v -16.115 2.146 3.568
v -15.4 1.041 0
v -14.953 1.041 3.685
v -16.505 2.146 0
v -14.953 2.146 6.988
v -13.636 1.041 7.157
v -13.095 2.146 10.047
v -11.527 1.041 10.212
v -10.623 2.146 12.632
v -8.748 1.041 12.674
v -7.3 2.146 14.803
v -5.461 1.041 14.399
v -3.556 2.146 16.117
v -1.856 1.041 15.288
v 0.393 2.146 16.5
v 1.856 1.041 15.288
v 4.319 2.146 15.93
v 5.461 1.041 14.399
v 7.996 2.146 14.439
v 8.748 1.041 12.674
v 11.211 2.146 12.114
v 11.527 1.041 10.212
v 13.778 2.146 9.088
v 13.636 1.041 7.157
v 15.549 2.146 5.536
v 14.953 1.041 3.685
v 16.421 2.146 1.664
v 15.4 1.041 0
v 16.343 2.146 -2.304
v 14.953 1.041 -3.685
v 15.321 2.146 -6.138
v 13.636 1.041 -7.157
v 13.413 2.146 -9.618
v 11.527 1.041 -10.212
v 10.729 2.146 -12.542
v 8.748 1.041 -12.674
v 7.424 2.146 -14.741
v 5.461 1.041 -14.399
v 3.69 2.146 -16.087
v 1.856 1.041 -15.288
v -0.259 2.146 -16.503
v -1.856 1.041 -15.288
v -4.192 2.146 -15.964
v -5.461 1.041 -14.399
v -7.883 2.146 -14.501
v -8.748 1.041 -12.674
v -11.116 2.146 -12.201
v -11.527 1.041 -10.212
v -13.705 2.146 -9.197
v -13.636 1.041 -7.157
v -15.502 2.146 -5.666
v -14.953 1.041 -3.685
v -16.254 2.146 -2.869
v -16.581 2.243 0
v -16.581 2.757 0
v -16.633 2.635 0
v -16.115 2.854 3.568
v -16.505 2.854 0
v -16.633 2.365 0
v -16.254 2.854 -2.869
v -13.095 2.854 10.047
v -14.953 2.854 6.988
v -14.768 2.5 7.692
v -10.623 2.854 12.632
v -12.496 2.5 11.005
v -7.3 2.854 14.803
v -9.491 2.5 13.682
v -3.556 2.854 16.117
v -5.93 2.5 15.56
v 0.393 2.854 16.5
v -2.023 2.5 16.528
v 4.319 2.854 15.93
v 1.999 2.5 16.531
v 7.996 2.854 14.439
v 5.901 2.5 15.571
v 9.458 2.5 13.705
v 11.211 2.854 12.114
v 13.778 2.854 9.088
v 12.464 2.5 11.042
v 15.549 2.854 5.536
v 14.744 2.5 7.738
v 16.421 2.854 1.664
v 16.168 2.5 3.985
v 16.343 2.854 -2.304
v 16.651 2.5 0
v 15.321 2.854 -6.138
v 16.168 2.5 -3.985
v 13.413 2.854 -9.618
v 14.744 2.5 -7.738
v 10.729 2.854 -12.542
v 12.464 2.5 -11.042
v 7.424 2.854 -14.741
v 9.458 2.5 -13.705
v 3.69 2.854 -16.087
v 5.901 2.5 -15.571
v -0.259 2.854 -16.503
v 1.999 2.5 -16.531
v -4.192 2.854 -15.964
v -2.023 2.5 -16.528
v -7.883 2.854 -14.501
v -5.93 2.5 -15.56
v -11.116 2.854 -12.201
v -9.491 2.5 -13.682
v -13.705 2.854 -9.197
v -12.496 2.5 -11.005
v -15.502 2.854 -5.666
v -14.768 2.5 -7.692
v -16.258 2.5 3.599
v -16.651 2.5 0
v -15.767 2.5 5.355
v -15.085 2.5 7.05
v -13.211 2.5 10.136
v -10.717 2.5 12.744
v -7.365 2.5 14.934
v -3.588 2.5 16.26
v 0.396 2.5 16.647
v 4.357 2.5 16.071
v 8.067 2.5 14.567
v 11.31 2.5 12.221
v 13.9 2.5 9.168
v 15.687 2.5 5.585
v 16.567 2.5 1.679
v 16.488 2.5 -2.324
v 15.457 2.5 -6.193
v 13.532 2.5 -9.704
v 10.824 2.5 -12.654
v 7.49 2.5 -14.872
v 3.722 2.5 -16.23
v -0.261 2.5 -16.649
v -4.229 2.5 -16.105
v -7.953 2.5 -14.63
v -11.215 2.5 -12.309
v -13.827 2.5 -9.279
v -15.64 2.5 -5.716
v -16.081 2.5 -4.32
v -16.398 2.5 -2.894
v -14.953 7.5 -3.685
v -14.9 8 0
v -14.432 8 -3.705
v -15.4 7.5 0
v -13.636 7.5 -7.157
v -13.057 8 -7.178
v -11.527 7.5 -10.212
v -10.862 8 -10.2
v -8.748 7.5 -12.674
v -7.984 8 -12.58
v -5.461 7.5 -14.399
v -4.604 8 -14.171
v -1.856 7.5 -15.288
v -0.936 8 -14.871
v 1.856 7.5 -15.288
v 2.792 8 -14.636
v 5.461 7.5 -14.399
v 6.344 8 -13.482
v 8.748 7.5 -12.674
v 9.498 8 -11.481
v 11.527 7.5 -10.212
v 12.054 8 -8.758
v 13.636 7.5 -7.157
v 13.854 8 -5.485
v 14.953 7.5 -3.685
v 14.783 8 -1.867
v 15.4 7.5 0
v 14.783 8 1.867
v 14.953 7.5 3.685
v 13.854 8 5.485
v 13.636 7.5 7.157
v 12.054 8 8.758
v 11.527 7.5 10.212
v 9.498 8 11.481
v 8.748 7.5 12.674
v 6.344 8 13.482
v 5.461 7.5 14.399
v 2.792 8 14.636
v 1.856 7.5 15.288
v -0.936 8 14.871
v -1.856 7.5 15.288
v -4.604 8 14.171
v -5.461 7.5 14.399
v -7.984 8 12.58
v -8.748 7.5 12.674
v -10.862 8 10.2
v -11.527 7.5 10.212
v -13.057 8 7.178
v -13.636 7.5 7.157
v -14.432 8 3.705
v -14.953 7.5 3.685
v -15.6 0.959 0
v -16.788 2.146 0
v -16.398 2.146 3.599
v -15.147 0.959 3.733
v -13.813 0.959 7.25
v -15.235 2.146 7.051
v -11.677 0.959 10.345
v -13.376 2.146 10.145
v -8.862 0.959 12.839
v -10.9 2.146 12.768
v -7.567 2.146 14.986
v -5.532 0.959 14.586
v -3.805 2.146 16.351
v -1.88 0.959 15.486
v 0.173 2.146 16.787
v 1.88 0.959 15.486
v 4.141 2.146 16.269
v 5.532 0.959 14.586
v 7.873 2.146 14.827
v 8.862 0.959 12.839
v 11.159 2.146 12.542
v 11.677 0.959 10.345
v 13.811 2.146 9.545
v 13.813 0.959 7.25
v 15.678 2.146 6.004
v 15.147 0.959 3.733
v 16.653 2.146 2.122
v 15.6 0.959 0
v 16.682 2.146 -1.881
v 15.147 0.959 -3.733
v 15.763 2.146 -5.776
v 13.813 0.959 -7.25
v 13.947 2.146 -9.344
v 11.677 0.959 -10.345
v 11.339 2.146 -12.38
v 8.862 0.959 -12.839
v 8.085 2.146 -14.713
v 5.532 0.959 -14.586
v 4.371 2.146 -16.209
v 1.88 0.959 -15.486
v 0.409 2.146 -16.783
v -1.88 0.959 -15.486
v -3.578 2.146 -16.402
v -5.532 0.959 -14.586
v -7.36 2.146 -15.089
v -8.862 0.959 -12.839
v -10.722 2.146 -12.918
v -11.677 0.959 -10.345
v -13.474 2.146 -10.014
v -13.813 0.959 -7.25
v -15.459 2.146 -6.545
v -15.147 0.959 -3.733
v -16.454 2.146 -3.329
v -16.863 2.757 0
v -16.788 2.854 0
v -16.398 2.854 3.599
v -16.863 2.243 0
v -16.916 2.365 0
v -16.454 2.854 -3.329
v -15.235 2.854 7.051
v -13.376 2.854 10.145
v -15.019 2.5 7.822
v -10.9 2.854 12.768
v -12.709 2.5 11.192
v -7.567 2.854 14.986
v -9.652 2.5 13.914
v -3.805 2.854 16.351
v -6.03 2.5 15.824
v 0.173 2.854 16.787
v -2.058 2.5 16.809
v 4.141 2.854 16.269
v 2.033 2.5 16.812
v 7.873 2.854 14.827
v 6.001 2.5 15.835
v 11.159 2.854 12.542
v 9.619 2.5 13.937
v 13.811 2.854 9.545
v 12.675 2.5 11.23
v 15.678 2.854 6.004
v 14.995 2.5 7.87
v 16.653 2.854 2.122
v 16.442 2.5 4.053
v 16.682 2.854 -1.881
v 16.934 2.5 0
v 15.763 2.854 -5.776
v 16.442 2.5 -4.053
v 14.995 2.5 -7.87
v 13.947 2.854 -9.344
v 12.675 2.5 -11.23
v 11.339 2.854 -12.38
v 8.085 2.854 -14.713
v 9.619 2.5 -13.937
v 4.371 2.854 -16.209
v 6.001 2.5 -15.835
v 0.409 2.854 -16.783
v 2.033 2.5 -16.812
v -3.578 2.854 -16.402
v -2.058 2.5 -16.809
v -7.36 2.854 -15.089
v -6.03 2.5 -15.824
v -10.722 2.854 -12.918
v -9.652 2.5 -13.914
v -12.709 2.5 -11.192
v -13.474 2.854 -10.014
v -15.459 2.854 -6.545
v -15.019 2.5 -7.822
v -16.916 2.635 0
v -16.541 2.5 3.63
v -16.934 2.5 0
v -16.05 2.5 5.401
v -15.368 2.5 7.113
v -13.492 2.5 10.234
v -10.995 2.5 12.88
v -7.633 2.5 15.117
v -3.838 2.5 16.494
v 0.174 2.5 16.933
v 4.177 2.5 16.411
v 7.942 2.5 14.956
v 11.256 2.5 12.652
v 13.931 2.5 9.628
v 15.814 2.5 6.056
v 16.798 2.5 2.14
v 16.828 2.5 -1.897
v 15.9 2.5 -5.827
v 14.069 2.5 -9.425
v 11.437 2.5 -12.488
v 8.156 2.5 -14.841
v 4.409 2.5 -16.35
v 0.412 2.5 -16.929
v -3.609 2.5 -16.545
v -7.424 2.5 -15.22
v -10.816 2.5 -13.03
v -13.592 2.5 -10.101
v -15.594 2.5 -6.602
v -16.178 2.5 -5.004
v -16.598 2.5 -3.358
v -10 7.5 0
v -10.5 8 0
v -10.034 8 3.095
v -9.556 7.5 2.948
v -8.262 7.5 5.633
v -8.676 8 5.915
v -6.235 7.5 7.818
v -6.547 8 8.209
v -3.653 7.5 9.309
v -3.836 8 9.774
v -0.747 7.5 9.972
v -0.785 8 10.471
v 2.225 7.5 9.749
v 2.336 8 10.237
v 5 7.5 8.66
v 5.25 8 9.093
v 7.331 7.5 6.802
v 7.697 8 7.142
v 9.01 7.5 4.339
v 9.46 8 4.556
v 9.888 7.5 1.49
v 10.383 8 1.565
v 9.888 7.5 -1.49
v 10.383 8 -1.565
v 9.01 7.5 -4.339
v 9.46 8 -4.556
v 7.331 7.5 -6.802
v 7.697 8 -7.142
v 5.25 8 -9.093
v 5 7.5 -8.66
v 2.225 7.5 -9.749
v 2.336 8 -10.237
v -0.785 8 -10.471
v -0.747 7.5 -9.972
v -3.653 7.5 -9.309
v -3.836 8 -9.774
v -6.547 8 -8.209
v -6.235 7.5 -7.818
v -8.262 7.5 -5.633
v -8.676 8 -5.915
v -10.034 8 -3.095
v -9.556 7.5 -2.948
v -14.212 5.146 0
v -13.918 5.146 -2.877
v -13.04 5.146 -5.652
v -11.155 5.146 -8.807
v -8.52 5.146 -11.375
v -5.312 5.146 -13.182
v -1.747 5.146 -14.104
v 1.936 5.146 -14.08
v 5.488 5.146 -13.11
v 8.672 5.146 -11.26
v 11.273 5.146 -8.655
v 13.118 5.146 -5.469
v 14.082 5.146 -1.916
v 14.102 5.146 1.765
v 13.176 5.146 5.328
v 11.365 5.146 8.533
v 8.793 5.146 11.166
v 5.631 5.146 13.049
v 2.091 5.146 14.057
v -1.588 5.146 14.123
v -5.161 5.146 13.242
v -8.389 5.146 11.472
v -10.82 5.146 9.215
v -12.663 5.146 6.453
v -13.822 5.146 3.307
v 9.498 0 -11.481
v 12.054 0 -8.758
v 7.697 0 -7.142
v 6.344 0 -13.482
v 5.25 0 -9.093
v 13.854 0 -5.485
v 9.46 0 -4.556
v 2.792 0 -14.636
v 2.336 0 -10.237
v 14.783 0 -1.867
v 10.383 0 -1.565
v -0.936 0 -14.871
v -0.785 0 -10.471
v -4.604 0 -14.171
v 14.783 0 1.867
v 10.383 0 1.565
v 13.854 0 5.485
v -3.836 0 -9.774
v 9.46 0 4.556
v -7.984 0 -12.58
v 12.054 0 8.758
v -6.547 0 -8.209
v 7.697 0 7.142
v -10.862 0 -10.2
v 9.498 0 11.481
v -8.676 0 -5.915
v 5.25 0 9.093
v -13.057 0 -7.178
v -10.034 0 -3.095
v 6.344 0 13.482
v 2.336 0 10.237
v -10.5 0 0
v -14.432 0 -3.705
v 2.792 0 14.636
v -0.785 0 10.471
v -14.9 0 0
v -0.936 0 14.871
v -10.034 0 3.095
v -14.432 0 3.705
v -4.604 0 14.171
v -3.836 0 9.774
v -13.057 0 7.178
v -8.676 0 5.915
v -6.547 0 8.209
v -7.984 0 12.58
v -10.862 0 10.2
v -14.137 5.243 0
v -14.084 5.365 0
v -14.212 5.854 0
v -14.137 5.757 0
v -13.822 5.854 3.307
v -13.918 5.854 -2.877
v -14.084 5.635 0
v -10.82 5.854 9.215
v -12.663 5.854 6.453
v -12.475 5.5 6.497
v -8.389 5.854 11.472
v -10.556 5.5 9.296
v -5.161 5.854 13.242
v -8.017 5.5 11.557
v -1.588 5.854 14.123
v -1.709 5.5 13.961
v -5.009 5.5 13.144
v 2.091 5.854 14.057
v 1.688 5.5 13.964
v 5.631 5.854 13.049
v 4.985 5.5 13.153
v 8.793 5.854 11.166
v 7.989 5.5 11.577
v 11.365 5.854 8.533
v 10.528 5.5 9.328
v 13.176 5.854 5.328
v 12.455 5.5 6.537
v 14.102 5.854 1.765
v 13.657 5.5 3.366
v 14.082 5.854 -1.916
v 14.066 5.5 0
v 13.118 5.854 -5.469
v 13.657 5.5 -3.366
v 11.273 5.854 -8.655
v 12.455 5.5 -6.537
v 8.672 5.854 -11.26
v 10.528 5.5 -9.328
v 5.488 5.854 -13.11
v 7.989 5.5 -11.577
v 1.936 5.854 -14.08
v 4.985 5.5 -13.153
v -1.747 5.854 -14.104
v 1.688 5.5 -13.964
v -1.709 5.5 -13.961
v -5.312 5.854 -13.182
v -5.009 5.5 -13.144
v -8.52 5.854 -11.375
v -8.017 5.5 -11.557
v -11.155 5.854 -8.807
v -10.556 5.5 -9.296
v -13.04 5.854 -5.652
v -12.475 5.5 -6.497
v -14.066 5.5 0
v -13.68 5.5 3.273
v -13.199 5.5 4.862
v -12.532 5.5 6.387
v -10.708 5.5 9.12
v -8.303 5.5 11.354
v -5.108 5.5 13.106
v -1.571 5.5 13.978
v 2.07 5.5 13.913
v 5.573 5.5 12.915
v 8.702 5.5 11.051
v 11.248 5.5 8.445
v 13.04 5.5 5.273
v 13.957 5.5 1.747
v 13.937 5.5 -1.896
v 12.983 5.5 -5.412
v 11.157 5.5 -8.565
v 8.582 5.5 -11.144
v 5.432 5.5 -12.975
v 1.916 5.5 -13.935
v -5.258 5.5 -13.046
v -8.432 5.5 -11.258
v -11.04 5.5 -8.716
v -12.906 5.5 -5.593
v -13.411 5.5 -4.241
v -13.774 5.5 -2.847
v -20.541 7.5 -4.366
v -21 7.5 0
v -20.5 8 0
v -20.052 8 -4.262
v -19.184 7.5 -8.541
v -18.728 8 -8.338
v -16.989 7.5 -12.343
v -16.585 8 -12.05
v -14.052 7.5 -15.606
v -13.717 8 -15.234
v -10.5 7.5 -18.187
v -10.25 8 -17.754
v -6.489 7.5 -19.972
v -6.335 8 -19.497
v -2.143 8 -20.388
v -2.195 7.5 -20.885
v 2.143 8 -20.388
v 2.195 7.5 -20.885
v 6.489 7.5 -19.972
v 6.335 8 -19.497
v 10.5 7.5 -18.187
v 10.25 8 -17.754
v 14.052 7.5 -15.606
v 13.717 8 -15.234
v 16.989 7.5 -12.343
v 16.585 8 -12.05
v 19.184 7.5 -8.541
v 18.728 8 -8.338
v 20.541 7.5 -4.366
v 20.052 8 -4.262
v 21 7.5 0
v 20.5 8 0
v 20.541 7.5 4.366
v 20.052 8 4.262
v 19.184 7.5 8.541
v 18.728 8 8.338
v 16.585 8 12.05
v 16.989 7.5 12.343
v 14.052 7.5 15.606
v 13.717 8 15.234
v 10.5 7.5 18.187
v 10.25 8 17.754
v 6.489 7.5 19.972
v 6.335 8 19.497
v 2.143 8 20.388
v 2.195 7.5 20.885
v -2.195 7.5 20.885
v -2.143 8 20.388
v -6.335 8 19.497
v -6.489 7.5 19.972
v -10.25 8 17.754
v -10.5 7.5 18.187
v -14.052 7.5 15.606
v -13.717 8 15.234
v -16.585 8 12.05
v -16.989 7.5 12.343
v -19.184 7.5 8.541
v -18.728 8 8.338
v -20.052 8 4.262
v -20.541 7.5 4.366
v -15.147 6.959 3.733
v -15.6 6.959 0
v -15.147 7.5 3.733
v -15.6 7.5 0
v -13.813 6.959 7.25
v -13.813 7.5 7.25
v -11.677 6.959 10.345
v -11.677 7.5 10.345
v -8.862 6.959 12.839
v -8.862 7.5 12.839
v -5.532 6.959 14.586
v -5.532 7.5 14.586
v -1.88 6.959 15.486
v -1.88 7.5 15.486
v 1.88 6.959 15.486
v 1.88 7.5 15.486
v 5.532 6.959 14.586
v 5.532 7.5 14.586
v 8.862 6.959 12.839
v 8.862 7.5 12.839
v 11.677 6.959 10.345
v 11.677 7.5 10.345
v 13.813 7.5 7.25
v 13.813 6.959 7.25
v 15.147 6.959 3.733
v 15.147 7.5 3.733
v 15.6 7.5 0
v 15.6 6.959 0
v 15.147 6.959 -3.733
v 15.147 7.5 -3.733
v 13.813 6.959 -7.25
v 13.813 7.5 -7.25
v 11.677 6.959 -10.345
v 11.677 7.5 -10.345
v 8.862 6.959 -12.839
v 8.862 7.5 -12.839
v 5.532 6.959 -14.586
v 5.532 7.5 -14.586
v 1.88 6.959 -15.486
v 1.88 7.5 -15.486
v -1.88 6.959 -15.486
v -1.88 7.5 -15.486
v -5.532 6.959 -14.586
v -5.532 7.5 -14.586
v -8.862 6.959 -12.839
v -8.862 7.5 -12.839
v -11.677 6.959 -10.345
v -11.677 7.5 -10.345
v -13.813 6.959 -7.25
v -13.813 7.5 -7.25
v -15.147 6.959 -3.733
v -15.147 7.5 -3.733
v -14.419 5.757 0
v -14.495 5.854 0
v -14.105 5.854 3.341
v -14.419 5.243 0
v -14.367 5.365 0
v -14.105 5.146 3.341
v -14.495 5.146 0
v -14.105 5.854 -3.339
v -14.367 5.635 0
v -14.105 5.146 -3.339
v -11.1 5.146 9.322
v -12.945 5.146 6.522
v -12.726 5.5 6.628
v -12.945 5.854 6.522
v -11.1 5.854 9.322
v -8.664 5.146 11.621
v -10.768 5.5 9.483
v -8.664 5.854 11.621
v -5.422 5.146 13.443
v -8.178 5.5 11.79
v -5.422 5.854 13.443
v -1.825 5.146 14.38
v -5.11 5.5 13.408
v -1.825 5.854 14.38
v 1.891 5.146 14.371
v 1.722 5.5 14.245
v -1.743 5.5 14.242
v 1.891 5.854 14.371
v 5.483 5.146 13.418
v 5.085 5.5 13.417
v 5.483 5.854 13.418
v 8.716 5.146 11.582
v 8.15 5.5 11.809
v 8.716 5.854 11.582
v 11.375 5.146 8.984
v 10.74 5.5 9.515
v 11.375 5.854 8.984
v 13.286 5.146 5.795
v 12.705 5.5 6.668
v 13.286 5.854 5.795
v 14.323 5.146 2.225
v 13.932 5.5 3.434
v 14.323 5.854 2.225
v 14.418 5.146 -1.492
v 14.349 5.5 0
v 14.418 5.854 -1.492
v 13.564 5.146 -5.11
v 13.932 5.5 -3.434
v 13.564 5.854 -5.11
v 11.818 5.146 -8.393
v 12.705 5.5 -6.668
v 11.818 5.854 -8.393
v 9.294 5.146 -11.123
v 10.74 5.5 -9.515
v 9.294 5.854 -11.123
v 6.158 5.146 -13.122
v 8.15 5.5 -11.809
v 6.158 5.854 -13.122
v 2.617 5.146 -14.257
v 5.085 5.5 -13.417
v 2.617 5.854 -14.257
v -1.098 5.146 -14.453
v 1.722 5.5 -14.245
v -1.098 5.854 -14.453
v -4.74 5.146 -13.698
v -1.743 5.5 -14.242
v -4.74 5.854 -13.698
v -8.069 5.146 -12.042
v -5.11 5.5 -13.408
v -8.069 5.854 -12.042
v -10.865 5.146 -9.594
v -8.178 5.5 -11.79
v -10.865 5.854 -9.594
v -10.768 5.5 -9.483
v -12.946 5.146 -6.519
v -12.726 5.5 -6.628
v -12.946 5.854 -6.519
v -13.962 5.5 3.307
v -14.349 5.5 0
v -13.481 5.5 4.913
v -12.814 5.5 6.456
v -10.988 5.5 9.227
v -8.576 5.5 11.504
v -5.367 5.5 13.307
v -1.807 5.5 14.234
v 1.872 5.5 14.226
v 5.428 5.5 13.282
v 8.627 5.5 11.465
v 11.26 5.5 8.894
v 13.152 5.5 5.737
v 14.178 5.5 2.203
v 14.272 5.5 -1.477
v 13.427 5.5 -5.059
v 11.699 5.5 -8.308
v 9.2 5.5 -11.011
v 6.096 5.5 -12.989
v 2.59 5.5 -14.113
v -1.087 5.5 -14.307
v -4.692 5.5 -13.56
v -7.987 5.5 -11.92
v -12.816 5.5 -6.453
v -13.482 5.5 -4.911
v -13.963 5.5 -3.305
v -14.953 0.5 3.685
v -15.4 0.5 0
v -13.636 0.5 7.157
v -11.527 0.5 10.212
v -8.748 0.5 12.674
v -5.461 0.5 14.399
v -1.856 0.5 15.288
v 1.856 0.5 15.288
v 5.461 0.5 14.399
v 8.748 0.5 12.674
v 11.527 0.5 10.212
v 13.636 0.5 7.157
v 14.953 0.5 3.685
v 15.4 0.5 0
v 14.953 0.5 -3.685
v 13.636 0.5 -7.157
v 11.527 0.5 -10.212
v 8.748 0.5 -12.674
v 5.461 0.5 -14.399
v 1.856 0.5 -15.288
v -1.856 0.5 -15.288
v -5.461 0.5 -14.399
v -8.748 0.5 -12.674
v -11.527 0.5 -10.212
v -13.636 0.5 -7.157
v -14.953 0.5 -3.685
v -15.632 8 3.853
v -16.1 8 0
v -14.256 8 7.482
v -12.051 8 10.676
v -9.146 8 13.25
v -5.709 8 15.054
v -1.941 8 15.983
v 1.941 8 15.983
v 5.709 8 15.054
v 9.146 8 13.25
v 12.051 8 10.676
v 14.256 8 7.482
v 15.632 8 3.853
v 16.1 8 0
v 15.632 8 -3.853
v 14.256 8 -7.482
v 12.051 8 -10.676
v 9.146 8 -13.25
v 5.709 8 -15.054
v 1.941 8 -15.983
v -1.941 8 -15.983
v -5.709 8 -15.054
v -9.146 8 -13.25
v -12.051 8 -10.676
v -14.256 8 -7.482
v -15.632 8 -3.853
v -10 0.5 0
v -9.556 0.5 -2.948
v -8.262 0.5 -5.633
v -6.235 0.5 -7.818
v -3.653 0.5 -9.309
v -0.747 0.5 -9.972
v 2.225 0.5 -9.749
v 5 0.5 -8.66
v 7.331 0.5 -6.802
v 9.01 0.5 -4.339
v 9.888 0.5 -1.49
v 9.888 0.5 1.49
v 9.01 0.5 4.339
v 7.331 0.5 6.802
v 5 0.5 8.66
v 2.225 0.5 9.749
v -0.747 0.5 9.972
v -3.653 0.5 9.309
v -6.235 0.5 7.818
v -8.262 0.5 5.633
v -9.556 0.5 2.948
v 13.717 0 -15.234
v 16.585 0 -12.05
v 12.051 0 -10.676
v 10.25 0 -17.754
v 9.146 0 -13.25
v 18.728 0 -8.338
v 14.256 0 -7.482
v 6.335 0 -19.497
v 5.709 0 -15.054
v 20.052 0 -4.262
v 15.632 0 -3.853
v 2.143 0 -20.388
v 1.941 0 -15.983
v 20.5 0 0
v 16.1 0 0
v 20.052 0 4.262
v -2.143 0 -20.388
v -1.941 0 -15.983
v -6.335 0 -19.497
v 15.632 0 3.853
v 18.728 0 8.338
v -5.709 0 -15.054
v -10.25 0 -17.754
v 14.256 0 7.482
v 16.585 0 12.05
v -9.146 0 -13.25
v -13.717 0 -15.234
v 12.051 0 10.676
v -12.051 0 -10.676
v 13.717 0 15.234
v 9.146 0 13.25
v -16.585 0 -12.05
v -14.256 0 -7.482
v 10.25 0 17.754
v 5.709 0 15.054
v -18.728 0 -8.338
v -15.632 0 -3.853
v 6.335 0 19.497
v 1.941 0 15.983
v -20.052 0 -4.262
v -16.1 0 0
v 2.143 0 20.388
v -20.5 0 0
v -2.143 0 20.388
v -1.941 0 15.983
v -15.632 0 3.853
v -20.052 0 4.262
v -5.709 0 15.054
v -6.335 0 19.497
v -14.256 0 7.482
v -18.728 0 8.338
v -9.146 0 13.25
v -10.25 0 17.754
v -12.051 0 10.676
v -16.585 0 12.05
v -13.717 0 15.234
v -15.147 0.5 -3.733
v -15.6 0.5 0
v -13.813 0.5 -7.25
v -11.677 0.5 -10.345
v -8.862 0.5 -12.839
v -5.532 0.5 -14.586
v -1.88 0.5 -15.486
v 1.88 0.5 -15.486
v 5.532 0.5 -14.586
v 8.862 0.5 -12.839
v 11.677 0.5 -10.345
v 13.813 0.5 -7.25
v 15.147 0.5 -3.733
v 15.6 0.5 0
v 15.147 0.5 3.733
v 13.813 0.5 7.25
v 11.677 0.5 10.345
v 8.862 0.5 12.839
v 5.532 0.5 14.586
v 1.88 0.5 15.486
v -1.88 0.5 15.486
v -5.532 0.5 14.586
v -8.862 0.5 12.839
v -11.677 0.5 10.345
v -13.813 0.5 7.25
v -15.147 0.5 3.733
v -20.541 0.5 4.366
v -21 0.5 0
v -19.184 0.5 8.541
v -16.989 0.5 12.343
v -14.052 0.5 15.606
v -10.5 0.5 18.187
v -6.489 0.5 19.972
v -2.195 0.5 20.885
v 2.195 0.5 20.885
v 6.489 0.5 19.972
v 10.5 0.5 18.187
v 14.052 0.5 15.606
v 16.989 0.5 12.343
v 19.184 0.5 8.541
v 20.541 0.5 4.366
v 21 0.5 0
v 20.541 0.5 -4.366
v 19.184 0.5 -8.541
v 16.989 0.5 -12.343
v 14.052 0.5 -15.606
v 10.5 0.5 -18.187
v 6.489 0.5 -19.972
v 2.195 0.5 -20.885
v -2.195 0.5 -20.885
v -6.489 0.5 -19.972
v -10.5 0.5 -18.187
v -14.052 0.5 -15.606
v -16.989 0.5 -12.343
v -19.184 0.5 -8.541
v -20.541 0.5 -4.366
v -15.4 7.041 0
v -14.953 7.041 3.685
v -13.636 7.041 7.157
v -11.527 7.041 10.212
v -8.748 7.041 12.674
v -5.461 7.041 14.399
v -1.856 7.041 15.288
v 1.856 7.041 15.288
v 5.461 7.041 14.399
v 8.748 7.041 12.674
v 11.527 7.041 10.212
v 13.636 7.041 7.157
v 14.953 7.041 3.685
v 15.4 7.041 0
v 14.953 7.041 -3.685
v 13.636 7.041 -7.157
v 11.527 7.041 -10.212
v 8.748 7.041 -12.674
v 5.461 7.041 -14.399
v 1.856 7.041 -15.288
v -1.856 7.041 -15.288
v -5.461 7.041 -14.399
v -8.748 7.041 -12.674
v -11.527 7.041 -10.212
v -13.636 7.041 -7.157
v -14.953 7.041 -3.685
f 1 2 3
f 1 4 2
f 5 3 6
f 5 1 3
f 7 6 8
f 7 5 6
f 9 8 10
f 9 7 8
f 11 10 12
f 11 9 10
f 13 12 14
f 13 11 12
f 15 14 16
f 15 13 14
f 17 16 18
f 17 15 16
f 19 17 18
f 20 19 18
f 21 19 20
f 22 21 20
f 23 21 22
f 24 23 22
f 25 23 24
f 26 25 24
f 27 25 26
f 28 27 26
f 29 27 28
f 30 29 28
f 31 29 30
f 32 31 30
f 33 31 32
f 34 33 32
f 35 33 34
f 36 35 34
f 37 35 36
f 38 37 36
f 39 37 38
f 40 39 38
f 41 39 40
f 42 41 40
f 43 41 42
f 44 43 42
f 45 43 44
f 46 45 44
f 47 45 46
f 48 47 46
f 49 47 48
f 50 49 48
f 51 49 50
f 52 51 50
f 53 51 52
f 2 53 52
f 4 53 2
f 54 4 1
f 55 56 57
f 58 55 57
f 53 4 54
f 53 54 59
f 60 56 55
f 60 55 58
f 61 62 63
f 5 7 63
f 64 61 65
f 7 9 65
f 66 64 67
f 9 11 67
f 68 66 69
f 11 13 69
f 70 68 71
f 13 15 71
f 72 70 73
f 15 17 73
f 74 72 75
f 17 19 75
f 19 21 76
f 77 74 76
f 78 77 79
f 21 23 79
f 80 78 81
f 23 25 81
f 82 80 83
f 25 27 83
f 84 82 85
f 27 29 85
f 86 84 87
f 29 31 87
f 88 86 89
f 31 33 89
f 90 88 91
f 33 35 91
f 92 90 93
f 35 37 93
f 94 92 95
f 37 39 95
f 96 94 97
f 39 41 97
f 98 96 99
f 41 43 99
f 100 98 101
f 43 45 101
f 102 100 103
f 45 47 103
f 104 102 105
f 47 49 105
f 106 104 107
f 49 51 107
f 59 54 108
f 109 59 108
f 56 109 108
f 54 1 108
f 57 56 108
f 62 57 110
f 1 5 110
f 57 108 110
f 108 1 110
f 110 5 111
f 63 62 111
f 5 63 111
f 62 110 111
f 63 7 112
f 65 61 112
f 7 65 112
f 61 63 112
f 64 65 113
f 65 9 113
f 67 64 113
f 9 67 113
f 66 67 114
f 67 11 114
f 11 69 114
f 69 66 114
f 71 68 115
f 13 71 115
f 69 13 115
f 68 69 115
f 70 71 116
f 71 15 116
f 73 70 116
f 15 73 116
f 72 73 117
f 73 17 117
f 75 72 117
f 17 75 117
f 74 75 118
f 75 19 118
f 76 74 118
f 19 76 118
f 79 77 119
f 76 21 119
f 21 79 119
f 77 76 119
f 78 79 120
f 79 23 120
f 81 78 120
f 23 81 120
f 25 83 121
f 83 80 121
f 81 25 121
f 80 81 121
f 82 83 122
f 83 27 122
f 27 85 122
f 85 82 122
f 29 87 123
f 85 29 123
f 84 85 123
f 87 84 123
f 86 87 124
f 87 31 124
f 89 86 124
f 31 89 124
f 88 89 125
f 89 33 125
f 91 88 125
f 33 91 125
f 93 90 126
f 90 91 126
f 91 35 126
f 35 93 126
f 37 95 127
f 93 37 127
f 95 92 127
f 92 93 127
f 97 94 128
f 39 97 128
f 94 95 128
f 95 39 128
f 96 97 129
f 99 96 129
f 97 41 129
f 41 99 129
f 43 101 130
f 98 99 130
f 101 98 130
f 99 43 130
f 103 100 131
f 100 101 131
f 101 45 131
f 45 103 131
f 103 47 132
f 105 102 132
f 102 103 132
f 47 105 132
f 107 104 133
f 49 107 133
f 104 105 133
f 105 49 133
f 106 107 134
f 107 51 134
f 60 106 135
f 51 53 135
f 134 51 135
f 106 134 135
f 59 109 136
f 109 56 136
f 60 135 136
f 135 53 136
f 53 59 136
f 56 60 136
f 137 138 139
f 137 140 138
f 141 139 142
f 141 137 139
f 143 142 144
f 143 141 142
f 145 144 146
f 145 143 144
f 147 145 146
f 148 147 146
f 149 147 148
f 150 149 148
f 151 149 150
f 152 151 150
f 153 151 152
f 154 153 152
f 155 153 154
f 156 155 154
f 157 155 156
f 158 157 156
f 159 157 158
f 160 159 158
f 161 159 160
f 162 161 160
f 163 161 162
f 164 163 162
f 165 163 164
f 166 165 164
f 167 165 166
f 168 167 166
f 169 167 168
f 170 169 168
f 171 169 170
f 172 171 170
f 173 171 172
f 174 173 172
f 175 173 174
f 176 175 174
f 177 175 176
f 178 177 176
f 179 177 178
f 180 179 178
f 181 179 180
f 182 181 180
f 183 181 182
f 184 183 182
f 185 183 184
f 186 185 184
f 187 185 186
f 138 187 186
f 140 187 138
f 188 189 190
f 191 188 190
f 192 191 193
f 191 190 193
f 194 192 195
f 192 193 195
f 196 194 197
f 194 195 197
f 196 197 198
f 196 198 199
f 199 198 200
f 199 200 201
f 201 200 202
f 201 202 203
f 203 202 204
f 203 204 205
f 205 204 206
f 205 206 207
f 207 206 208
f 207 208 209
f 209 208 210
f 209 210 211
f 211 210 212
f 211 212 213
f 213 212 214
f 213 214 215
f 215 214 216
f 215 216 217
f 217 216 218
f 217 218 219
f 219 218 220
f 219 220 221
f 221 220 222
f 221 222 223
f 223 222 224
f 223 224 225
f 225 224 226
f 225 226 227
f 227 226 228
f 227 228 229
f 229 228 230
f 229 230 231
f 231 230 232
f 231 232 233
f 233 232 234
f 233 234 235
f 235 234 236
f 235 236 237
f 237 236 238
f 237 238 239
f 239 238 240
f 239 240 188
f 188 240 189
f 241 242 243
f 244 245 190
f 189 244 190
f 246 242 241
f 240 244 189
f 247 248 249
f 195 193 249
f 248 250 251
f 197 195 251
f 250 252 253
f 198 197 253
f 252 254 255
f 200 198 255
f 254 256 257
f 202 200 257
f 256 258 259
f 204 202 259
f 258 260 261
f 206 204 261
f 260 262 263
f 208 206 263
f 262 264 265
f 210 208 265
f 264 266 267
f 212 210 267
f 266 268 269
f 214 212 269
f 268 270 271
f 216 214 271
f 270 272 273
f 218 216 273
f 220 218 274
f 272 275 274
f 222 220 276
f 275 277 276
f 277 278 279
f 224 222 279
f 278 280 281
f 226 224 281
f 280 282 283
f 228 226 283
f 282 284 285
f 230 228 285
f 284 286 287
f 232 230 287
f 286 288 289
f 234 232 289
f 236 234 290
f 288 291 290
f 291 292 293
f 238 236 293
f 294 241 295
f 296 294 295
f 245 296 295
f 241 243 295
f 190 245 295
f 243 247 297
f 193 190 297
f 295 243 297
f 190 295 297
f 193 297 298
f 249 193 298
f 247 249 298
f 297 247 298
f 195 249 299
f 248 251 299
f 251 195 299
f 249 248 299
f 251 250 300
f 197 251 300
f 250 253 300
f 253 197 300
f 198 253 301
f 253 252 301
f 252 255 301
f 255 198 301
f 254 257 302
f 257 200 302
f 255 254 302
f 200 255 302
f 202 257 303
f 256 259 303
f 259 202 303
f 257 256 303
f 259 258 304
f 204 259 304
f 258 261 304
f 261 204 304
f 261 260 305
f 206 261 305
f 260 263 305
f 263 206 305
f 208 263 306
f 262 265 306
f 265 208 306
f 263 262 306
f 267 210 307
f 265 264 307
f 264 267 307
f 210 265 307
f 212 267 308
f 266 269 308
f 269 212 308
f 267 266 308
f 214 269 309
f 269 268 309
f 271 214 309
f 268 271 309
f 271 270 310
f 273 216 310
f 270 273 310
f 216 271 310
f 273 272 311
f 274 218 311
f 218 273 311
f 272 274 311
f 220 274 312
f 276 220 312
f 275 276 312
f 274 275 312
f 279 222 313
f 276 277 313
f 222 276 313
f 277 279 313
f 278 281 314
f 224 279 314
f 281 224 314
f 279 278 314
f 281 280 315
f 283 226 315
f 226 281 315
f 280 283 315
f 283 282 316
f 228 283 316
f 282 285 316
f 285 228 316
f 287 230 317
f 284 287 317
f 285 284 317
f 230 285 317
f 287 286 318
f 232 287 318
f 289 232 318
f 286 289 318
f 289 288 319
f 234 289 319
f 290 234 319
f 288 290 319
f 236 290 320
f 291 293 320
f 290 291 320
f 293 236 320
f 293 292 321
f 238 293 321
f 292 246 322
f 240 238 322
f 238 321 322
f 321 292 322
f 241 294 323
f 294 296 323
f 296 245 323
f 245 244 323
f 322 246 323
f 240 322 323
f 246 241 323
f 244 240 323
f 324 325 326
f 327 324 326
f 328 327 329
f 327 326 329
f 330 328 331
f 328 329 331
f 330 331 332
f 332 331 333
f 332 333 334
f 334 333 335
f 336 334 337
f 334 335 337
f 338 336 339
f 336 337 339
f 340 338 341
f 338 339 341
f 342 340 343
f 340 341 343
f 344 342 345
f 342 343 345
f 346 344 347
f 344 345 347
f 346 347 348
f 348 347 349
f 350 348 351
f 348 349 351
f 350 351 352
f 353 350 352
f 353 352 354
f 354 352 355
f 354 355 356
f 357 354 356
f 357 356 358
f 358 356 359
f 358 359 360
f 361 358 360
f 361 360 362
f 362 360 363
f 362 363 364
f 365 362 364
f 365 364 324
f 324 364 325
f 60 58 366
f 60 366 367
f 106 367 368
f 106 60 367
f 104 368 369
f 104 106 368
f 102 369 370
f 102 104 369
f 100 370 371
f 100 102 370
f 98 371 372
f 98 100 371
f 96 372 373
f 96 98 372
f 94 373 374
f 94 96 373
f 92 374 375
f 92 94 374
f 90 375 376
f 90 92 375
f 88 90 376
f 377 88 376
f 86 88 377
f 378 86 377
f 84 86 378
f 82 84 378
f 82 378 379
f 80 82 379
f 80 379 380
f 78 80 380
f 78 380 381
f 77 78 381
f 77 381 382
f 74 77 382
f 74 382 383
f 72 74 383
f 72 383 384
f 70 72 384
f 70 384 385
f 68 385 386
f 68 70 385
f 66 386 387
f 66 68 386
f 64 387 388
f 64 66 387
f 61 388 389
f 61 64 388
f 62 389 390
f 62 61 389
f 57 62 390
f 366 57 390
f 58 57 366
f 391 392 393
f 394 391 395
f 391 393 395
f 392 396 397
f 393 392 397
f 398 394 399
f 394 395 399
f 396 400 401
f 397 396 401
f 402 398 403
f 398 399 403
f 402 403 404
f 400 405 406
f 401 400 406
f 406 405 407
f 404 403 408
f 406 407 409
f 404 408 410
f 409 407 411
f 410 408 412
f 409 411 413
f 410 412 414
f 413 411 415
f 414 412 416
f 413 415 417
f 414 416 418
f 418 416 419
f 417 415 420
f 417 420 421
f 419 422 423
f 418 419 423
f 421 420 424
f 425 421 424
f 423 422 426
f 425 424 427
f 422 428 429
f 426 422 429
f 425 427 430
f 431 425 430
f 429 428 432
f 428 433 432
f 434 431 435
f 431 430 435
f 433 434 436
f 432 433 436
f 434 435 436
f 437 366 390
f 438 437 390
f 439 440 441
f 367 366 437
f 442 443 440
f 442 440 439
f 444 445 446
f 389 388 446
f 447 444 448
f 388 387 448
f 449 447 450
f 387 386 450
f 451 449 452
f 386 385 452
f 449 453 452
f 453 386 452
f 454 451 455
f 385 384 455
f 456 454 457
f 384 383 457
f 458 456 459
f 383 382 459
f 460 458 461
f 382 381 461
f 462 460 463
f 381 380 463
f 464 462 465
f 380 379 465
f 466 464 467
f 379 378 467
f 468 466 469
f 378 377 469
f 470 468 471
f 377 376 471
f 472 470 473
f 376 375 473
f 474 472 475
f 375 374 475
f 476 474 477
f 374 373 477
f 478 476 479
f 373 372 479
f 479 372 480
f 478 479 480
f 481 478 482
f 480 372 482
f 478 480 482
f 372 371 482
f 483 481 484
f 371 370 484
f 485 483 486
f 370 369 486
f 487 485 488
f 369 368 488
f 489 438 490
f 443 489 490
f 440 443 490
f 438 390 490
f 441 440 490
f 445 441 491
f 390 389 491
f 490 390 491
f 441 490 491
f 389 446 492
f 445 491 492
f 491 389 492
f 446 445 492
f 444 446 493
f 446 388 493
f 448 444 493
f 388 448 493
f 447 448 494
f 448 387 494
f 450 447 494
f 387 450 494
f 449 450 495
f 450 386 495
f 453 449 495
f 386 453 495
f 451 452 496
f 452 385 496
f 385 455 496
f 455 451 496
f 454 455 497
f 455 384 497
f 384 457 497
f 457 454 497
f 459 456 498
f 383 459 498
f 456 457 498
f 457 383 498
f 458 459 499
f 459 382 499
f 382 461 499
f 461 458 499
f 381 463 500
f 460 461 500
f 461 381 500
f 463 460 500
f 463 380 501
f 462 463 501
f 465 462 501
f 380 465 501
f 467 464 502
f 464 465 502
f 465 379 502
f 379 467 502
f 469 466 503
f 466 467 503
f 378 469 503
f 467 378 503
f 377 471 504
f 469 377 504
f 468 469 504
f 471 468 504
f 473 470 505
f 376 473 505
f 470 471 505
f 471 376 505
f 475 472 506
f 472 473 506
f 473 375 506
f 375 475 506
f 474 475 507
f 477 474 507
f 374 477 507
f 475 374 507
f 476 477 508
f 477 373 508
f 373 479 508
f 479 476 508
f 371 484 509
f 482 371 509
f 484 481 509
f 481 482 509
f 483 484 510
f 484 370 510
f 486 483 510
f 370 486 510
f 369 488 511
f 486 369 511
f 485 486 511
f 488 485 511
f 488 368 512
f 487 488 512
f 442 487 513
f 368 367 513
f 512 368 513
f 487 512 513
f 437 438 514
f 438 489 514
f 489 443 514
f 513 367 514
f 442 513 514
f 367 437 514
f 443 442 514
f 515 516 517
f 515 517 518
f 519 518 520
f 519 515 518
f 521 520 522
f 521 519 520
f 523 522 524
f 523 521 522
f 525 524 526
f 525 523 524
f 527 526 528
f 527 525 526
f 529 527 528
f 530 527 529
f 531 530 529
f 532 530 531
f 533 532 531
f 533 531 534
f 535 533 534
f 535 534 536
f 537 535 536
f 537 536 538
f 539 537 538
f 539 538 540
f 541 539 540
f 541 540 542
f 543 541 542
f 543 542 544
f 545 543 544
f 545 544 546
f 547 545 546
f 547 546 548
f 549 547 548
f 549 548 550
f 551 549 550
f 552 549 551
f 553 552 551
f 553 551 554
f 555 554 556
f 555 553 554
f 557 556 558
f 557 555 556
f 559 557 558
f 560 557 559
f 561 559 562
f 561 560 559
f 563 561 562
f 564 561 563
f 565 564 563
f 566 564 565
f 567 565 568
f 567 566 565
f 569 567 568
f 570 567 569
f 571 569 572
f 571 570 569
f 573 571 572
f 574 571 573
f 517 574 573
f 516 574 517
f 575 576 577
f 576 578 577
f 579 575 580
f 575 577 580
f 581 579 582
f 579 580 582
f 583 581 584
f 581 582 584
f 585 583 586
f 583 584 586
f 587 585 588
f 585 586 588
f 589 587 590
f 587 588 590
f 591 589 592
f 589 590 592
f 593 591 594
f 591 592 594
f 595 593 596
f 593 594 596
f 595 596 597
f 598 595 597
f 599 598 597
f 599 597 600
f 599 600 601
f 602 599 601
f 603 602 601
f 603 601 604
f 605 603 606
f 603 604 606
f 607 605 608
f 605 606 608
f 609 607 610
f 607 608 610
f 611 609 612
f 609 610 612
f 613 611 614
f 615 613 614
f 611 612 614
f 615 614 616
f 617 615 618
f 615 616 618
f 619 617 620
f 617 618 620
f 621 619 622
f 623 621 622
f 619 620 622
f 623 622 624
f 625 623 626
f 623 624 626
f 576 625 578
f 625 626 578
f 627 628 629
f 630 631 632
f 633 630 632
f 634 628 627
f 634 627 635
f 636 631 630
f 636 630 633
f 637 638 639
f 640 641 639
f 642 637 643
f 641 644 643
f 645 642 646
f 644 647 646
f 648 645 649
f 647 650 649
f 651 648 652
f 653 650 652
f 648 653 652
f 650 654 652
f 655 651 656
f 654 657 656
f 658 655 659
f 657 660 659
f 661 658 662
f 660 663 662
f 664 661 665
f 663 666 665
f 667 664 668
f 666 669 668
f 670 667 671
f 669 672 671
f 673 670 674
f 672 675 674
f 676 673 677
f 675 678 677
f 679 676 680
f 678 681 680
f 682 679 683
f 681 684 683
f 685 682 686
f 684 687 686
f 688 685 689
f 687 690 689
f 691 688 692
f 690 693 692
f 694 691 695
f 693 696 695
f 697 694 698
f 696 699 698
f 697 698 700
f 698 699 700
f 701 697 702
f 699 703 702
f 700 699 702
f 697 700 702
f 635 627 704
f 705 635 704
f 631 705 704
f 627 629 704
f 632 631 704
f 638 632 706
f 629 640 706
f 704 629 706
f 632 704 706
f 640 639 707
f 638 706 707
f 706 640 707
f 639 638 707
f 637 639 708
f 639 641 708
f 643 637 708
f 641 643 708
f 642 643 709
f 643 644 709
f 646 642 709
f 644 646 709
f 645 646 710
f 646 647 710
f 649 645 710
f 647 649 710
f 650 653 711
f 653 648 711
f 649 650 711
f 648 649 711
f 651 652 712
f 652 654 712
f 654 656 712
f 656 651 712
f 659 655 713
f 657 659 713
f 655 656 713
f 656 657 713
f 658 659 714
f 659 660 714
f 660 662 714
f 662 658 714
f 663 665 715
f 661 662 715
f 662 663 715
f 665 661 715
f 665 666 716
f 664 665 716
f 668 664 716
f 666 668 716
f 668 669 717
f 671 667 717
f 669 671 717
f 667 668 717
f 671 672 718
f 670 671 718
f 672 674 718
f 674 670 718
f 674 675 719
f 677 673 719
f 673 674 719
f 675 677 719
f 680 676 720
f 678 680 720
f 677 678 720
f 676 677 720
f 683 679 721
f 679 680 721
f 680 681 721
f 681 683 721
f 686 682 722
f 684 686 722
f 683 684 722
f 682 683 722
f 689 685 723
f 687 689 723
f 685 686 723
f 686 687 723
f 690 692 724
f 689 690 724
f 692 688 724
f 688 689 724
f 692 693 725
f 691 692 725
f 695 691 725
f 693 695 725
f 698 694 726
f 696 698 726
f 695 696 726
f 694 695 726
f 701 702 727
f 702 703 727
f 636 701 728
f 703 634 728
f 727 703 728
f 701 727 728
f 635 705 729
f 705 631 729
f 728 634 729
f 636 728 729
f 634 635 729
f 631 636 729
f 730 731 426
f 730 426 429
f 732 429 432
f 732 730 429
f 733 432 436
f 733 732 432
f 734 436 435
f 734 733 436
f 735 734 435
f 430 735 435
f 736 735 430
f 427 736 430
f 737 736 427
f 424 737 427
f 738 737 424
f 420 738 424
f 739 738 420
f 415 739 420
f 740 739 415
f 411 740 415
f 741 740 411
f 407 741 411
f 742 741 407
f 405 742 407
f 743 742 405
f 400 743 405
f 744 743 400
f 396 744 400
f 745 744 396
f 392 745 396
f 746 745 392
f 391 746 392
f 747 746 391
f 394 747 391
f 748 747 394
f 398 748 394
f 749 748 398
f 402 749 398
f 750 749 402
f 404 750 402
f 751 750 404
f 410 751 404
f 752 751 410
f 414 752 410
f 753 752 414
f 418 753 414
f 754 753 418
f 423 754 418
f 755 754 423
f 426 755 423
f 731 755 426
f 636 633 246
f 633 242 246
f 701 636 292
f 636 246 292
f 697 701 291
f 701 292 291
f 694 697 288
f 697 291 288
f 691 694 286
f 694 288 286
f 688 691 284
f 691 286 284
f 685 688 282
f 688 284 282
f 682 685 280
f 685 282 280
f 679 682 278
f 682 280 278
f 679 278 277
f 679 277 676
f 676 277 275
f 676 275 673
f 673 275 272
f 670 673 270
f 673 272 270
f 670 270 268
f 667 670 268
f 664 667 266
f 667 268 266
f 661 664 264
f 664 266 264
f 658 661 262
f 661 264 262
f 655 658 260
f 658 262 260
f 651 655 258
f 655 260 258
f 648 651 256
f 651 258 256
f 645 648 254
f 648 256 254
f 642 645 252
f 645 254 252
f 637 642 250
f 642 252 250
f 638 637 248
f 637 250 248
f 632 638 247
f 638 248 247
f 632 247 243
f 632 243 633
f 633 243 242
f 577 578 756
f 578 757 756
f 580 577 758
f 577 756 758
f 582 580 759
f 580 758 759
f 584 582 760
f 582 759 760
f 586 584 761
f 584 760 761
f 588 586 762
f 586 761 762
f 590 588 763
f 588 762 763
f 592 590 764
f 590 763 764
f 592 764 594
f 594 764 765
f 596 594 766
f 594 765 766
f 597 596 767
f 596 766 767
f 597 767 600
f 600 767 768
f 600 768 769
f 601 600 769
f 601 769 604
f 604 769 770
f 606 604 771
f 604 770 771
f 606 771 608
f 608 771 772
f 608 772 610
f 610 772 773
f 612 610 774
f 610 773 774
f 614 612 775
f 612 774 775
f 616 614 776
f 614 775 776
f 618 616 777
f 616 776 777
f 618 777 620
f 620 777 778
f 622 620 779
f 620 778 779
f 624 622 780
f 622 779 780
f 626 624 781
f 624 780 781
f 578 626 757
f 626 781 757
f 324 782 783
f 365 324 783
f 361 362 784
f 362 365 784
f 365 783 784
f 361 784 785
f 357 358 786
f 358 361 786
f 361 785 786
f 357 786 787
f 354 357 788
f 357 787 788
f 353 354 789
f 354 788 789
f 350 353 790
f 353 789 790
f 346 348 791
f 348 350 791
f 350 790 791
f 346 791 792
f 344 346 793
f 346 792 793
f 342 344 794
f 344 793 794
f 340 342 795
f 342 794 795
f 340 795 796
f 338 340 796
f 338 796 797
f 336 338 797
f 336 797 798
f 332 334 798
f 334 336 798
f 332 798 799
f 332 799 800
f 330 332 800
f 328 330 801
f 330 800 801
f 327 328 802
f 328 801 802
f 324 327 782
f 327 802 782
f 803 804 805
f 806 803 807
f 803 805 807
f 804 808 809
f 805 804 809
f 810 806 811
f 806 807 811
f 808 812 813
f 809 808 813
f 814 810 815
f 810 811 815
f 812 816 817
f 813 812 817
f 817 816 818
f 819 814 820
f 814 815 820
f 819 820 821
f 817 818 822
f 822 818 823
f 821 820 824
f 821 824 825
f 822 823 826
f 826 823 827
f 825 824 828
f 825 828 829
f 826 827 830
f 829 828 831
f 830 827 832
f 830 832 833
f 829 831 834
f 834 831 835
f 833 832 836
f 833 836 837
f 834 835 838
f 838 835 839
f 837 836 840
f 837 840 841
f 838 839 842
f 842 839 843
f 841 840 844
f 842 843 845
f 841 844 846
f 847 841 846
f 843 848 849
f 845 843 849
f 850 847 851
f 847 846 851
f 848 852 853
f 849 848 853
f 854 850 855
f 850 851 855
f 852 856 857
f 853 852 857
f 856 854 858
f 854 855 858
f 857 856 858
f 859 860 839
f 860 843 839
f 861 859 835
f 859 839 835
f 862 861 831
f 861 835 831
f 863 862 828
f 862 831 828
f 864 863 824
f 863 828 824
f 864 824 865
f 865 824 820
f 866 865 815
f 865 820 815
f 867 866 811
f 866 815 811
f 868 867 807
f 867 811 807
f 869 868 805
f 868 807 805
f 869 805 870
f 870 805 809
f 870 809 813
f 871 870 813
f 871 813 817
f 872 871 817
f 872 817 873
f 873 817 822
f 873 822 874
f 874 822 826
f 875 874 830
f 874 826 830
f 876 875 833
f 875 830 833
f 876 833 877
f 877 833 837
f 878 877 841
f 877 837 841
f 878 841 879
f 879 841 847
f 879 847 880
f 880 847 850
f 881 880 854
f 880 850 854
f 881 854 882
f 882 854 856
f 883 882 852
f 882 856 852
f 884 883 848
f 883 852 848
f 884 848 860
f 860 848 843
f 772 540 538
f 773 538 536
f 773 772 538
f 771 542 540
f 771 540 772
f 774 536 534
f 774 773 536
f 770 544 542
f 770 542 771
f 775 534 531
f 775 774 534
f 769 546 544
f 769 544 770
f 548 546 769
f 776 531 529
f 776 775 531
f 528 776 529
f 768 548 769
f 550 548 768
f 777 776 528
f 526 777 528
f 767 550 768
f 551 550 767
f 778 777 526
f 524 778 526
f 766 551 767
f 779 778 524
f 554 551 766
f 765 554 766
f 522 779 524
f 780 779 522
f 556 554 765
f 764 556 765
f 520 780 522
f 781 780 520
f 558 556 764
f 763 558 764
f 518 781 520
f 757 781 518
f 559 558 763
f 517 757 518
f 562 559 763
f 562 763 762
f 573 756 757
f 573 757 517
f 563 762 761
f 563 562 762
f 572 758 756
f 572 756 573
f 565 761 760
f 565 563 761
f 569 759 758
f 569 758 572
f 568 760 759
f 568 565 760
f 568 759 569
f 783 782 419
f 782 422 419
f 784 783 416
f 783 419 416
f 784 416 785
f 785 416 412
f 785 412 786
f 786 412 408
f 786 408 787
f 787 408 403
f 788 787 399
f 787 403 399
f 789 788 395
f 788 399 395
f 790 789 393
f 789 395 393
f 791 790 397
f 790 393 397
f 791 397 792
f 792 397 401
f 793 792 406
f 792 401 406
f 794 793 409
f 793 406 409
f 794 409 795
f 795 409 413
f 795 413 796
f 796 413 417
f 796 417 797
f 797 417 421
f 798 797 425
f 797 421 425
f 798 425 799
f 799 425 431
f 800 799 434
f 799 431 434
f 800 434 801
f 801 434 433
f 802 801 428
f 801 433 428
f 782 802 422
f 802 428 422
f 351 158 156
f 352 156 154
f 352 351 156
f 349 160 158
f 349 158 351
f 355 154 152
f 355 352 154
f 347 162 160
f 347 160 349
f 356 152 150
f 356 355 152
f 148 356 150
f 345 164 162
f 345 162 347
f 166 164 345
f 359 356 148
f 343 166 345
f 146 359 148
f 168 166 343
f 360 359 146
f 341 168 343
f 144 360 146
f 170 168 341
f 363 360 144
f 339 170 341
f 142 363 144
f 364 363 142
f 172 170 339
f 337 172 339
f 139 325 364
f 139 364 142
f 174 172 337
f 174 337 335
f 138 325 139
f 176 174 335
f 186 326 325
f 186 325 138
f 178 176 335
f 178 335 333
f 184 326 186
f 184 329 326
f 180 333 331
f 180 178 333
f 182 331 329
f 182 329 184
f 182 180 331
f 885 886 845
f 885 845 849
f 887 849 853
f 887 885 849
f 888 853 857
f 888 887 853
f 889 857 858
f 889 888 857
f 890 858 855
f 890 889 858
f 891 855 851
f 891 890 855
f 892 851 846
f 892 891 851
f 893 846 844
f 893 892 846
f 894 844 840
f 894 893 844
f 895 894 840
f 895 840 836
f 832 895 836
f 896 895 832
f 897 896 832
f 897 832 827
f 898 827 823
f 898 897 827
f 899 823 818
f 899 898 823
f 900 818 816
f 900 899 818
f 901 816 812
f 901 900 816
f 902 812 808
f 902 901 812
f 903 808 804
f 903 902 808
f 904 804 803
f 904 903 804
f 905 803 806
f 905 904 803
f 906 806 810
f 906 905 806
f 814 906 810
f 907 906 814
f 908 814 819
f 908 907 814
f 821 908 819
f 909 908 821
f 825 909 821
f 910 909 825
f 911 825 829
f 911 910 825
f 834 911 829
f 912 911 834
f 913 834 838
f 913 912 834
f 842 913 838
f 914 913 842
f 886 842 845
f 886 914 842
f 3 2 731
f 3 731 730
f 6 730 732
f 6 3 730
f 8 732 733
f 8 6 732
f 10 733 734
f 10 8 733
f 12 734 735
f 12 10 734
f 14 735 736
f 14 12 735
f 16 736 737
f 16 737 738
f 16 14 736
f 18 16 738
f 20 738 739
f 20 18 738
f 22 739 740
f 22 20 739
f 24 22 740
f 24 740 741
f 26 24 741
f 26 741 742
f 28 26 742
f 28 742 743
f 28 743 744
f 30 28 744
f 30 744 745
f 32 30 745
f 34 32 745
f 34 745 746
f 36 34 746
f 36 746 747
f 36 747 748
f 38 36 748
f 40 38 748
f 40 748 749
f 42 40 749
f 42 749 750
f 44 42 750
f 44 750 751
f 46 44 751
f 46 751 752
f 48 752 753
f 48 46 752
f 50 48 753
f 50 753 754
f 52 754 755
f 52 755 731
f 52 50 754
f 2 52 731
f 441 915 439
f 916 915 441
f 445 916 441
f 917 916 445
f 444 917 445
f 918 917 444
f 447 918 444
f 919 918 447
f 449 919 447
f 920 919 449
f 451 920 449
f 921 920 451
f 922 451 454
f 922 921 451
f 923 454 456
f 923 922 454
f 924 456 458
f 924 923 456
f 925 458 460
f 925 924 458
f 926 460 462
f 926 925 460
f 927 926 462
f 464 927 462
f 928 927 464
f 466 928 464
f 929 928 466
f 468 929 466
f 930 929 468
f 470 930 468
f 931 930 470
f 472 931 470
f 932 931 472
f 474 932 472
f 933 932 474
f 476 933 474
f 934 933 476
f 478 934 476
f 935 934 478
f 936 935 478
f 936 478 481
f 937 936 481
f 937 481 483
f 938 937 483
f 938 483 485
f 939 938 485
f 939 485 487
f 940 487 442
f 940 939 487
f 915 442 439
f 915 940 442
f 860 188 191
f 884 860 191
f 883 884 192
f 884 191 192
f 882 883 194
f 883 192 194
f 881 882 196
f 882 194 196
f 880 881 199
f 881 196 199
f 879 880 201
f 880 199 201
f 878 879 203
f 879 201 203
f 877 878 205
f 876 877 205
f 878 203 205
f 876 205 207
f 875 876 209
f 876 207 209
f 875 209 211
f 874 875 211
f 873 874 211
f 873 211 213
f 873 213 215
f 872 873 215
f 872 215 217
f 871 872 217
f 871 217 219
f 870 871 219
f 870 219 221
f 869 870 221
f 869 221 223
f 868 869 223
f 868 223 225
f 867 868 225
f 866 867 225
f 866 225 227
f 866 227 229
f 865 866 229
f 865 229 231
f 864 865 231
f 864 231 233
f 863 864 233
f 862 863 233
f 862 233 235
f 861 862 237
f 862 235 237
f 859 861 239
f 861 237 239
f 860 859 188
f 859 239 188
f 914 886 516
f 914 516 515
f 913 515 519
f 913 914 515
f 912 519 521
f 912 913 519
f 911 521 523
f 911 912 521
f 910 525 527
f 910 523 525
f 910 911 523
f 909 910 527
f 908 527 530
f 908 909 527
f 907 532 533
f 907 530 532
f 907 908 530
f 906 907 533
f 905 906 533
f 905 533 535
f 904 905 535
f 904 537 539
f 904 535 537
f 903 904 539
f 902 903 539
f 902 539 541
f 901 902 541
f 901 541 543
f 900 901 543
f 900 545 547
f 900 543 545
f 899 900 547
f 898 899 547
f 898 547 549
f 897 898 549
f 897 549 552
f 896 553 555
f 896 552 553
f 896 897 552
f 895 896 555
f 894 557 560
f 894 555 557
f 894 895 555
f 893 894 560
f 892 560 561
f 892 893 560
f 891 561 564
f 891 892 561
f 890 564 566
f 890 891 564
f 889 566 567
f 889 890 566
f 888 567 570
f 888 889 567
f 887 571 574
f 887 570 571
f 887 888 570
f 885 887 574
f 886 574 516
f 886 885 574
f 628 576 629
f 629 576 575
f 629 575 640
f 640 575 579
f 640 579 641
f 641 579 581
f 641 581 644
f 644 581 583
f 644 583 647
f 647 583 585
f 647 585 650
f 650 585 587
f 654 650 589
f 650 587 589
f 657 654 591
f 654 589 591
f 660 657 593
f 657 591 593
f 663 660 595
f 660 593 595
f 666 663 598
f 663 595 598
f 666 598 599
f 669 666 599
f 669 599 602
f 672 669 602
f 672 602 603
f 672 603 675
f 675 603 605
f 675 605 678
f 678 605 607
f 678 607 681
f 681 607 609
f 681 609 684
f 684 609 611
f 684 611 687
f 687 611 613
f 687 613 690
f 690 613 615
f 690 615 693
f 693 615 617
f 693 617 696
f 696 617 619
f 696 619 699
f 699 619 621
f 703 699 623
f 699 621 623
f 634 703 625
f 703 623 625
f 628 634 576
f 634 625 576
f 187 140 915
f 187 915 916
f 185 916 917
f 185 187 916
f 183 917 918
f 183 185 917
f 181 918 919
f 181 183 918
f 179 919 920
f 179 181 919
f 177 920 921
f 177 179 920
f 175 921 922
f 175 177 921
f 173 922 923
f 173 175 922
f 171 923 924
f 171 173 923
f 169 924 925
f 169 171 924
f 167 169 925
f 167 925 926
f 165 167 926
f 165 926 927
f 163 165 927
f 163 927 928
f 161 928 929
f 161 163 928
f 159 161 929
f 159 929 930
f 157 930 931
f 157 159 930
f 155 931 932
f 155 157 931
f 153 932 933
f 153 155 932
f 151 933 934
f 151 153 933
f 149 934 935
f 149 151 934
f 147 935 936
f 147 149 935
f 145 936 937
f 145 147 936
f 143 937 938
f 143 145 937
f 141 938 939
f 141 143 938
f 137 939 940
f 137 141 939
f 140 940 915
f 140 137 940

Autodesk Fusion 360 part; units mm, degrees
sketch "profile" plane through (0, 0, 0) normal (0, 0, 1) x (1, 0, 0) in component "LR2051-822"
  line L0 (0, 0) -> (0, 8) construction
  line L1 (-10, 8) -> (-21, 8)
  line L2 (-21, 8) -> (-21, 0)
  line L3 (-21, 0) -> (-10, 0)
  line L4 (-10, 8) -> (-10, 0)
  line L5 (0, 8) -> (-10, 8) construction
  line L6 (-10, 0) -> (0, 0) construction
  line L7 (-15.5, 0) -> (-15.5, 1) construction
  line L8 (-15.5, 1) -> (-17, 2.5) construction
  line L9 (-17, 2.5) -> (-14, 5.5) construction
  line L10 (-14, 5.5) -> (-15.5, 7) construction
  line L11 (-15.5, 7) -> (-15.5, 8) construction
  line L12 (-10, 4) -> (-21, 4) construction
  line L13 (-15.5, 7) -> (-15.5, 1) construction
  line L14 (-15.4, 0) -> (-15.4, 1.0414)
  line L15 (-15.4, 1.0414) -> (-16.8586, 2.5)
  line L16 (-16.8586, 2.5) -> (-13.8586, 5.5)
  line L17 (-13.8586, 5.5) -> (-15.4, 7.0414)
  line L18 (-15.4, 7.0414) -> (-15.4, 8)
  line L19 (-15.6, 0) -> (-15.6, 0.9586)
  line L20 (-15.6, 0.9586) -> (-17.1414, 2.5)
  line L21 (-17.1414, 2.5) -> (-14.1414, 5.5)
  line L22 (-14.1414, 5.5) -> (-15.6, 6.9586)
  line L23 (-15.6, 6.9586) -> (-15.6, 8)
  point P0 (-15.5, 4)
  dimension "d4" = 21
  dimension "d5" = 10
  dimension "d6" = 45
  dimension "d7" = 1.5
  dimension "d8" = 1.5
  dimension "d9" = 8
  dimension "d10" = 0.1
  dimension "d11" = -0.1
revolve "Revolve1" add sketch "profile" angle 360 about axis through (0, 0, 0) along (0, 1, 0) contours L1 L3 L4 L14 L15 L16 L17 L18 makes body 1 in component "Inner Shell"
revolve "Revolve1'" add sketch "profile" angle 360 about axis through (0, 0, 0) along (0, 1, 0) separate body contours L1 L2 L3 L19 L20 L21 L22 L23 makes body 2 in component "Outer Shell"
chamfer "Chamfer1" distance 0.5 angle 45 2 edges at (-14.3578, 8, 5.5689) (-14.3578, 0, 5.5689) on bodies 1 in component "Inner Shell"
chamfer "Chamfer2" distance 0.5 angle 45 2 edges at (-9.3233, 8, 3.6162) (-9.3233, 0, 3.6162) on bodies 1 in component "Inner Shell"
chamfer "Chamfer1'" distance 0.5 angle 45 2 edges at (-14.5443, 8, 5.6412) (-14.5443, 0, 5.6412) on bodies 2 in component "Outer Shell"
chamfer "Chamfer2'" distance 0.5 angle 45 2 edges at (-19.5789, 8, 7.5939) (-19.5789, 0, 7.5939) on bodies 2 in component "Outer Shell"
fillet "Fillet1" radius 0.5 2 edges at (-12.9207, 5.5, 5.0115) (-15.7177, 2.5, 6.0963) on bodies 1 in component "Inner Shell"
fillet "Fillet1'" radius 0.5 2 edges at (-13.1844, 5.5, 5.1138) (-15.9814, 2.5, 6.1986) on bodies 2 in component "Outer Shell"
component "LR2051-822" placed x (1, 0, 0) y (0, 1, 0) z (0, 0, 1) at (0, 0, 0)
component "Inner Shell" placed x (1, 0, 0) y (0, 1, 0) z (0, 0, 1) at (0, 0, 0) in component "LR2051-822"
component "Outer Shell" placed x (1, 0, 0) y (0, 1, 0) z (0, 0, 1) at (0, 0, 0) in component "LR2051-822"
equation "inner_dia = 20 mm"
equation "outer_dia = 42 mm"
equation "width = 8 mm"
equation "d4 = outer_dia / 2"
equation "d5 = inner_dia / 2"
equation "d8 = d7"
equation "d9 = width"
equation "d10 = gap / 2"
equation "d11 = -gap / 2"
equation "gap = 0.2 mm"
equation "outer_chamfer = 0.5 mm"
equation "inner_chamfer = 0.5 mm"
equation "d17 = inner_chamfer"
equation "d18 = outer_chamfer"
equation "d19 = inner_chamfer"
equation "d20 = outer_chamfer"
